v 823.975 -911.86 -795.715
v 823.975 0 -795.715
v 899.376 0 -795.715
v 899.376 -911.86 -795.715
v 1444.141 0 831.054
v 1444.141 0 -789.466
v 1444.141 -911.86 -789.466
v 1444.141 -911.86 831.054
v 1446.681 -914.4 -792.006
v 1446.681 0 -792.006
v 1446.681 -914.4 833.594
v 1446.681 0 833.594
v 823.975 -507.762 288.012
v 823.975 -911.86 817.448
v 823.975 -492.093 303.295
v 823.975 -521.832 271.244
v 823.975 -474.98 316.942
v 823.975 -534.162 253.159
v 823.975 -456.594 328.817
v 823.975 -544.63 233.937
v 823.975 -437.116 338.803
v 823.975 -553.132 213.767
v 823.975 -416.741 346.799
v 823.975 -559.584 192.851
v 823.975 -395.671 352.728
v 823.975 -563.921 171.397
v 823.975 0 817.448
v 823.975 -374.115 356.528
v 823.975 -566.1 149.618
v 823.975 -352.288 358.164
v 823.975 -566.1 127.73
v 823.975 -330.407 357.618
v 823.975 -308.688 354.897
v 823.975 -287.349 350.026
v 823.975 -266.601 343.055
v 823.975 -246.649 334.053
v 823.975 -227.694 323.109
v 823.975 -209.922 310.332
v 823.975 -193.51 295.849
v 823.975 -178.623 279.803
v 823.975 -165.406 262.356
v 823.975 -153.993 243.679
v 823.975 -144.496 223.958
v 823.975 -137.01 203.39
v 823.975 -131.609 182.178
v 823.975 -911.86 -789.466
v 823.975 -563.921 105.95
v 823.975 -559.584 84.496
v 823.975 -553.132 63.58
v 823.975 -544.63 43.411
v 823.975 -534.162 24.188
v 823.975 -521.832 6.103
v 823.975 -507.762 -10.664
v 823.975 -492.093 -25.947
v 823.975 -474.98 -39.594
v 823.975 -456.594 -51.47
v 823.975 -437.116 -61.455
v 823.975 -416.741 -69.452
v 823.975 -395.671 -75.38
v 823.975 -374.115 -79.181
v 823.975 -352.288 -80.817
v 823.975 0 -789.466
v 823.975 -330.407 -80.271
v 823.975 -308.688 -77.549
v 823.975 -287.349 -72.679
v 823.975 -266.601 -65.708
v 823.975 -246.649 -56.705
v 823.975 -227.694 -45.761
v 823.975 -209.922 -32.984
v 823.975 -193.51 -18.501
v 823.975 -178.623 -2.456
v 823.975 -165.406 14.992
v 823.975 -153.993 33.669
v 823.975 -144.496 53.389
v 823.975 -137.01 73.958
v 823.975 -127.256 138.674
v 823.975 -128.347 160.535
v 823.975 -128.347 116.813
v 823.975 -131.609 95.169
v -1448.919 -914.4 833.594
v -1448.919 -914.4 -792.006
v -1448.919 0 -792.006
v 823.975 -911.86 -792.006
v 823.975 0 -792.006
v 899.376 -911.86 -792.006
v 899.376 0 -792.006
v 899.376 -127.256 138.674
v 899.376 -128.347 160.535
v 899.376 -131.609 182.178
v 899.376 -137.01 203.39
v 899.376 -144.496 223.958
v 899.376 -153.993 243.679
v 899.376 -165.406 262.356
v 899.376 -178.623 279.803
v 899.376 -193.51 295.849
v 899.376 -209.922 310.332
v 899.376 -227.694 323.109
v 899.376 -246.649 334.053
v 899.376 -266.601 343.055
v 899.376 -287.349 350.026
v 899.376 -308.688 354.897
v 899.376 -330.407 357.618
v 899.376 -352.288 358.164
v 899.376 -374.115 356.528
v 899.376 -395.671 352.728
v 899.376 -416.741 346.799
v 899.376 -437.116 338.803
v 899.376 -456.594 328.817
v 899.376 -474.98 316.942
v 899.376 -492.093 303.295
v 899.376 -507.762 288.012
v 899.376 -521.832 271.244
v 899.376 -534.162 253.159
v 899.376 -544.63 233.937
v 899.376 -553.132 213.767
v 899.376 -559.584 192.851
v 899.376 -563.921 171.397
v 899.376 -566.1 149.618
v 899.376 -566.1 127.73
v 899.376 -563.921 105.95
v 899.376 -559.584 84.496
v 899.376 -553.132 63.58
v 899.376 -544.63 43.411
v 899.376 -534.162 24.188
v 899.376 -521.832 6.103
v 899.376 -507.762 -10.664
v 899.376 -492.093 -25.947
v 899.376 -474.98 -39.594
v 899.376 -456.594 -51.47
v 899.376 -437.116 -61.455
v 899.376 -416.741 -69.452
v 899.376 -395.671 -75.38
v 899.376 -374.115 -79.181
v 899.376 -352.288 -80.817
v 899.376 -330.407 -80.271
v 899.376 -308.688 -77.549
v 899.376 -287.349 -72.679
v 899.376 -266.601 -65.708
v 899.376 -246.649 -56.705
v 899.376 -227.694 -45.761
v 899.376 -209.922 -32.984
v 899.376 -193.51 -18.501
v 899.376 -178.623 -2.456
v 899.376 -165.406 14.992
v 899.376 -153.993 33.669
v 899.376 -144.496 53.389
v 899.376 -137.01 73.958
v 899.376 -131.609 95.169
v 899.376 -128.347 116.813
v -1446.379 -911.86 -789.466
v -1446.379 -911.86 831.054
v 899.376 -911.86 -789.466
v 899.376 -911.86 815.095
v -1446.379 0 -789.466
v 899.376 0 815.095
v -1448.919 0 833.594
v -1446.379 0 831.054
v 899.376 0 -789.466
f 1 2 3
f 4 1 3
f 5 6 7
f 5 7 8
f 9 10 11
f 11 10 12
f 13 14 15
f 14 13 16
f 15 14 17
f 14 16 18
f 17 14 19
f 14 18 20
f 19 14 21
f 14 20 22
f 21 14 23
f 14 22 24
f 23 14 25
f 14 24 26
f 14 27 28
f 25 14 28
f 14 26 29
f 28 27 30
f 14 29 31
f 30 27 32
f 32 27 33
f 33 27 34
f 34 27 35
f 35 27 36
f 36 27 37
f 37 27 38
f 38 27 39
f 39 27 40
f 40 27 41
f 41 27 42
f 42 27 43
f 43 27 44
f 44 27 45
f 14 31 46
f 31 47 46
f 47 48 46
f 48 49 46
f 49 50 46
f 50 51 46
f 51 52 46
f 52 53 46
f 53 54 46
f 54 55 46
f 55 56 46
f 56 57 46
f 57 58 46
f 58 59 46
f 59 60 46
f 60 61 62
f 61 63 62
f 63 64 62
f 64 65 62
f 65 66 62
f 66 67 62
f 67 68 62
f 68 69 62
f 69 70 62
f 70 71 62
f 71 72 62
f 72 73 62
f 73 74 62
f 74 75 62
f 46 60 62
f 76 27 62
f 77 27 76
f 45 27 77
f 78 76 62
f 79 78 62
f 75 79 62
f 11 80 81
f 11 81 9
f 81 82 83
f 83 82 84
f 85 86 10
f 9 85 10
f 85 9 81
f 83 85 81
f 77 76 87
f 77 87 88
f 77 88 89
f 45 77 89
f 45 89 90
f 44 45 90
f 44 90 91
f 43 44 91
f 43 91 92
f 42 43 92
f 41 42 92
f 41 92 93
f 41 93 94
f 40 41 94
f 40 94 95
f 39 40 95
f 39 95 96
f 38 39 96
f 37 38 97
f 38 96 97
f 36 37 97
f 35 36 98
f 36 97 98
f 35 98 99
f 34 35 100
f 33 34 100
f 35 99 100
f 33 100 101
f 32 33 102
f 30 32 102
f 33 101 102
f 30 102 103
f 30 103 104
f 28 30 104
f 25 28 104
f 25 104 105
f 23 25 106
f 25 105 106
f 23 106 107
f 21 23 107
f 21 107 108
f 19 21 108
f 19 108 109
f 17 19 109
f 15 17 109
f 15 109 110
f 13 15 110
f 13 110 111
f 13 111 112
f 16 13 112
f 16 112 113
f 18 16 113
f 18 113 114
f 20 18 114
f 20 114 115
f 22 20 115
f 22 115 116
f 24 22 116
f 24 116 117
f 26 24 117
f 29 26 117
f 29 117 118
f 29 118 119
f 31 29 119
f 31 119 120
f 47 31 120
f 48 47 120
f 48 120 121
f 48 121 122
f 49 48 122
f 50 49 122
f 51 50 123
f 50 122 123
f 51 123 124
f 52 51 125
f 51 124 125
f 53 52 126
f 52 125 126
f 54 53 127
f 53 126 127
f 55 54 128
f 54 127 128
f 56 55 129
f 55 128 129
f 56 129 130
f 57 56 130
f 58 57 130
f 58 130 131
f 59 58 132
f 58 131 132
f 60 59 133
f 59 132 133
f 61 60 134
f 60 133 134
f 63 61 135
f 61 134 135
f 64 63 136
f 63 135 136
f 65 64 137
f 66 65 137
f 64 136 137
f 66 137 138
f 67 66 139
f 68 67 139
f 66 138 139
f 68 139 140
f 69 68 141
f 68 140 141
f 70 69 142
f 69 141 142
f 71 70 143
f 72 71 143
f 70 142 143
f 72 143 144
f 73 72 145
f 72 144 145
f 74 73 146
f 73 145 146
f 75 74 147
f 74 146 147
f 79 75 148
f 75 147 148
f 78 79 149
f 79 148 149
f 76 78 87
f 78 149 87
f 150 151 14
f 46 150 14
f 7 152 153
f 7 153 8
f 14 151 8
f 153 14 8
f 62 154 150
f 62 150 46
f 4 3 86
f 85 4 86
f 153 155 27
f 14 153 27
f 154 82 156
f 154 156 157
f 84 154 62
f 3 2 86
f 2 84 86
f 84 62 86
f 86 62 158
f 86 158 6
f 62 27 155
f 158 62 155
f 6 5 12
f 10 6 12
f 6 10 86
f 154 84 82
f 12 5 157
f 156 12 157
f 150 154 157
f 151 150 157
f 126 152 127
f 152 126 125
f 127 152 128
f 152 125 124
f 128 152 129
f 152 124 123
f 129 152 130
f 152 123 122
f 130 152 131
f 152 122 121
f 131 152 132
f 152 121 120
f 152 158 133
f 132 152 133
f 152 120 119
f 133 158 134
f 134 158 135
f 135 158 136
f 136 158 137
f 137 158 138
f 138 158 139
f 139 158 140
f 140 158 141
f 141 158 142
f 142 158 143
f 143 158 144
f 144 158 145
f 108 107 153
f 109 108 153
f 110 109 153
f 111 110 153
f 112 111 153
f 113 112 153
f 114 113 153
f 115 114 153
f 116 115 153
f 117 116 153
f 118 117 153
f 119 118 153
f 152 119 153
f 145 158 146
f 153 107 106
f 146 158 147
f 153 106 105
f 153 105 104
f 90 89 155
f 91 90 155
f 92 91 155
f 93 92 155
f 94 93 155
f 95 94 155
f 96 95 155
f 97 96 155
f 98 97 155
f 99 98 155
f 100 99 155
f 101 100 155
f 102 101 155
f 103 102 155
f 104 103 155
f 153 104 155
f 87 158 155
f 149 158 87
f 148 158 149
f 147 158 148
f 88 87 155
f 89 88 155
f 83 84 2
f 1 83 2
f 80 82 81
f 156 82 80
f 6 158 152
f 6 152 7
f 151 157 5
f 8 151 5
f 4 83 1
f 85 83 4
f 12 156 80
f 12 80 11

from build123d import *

# Parameters (mm, degrees)
F0_W     = 2895.6
F0_H     = 1625.6
F1_DEPTH = 914.4
F2_T     = -2.54
F4_DEPTH = 911.86
F5_R     = 219.558747
F6_DEPTH = 111.76


with BuildPart() as f1:
    # F0 (on Front) → F1 (new body)
    with BuildSketch(Plane.XZ):
        with Locations((-1.119167, 20.79364)):
            Rectangle(F0_W, F0_H)
    extrude(amount=F1_DEPTH)

    # F2
    f2_openings = [f1.faces().sort_by_distance(p)[0] for p in [
        (-1.119167, 0, 20.79364),
    ]]
    offset(amount=F2_T, openings=f2_openings)

    # F3 (on Front) → F4 (join)
    with BuildSketch(Plane.XZ):
        Polygon((899.375737, -795.714557), (899.375737, 815.094888), (823.975325, 817.448497), (823.975325, -795.714557), align=None)
    extrude(amount=F4_DEPTH)

    # F5 (on face) → F6 (cut)
    with BuildSketch(Plane.YZ.offset(899.375737)):
        with Locations((-346.814424, 138.673678)):
            Circle(F5_R)
    extrude(amount=-F6_DEPTH, mode=Mode.SUBTRACT)


solid = f1.part
